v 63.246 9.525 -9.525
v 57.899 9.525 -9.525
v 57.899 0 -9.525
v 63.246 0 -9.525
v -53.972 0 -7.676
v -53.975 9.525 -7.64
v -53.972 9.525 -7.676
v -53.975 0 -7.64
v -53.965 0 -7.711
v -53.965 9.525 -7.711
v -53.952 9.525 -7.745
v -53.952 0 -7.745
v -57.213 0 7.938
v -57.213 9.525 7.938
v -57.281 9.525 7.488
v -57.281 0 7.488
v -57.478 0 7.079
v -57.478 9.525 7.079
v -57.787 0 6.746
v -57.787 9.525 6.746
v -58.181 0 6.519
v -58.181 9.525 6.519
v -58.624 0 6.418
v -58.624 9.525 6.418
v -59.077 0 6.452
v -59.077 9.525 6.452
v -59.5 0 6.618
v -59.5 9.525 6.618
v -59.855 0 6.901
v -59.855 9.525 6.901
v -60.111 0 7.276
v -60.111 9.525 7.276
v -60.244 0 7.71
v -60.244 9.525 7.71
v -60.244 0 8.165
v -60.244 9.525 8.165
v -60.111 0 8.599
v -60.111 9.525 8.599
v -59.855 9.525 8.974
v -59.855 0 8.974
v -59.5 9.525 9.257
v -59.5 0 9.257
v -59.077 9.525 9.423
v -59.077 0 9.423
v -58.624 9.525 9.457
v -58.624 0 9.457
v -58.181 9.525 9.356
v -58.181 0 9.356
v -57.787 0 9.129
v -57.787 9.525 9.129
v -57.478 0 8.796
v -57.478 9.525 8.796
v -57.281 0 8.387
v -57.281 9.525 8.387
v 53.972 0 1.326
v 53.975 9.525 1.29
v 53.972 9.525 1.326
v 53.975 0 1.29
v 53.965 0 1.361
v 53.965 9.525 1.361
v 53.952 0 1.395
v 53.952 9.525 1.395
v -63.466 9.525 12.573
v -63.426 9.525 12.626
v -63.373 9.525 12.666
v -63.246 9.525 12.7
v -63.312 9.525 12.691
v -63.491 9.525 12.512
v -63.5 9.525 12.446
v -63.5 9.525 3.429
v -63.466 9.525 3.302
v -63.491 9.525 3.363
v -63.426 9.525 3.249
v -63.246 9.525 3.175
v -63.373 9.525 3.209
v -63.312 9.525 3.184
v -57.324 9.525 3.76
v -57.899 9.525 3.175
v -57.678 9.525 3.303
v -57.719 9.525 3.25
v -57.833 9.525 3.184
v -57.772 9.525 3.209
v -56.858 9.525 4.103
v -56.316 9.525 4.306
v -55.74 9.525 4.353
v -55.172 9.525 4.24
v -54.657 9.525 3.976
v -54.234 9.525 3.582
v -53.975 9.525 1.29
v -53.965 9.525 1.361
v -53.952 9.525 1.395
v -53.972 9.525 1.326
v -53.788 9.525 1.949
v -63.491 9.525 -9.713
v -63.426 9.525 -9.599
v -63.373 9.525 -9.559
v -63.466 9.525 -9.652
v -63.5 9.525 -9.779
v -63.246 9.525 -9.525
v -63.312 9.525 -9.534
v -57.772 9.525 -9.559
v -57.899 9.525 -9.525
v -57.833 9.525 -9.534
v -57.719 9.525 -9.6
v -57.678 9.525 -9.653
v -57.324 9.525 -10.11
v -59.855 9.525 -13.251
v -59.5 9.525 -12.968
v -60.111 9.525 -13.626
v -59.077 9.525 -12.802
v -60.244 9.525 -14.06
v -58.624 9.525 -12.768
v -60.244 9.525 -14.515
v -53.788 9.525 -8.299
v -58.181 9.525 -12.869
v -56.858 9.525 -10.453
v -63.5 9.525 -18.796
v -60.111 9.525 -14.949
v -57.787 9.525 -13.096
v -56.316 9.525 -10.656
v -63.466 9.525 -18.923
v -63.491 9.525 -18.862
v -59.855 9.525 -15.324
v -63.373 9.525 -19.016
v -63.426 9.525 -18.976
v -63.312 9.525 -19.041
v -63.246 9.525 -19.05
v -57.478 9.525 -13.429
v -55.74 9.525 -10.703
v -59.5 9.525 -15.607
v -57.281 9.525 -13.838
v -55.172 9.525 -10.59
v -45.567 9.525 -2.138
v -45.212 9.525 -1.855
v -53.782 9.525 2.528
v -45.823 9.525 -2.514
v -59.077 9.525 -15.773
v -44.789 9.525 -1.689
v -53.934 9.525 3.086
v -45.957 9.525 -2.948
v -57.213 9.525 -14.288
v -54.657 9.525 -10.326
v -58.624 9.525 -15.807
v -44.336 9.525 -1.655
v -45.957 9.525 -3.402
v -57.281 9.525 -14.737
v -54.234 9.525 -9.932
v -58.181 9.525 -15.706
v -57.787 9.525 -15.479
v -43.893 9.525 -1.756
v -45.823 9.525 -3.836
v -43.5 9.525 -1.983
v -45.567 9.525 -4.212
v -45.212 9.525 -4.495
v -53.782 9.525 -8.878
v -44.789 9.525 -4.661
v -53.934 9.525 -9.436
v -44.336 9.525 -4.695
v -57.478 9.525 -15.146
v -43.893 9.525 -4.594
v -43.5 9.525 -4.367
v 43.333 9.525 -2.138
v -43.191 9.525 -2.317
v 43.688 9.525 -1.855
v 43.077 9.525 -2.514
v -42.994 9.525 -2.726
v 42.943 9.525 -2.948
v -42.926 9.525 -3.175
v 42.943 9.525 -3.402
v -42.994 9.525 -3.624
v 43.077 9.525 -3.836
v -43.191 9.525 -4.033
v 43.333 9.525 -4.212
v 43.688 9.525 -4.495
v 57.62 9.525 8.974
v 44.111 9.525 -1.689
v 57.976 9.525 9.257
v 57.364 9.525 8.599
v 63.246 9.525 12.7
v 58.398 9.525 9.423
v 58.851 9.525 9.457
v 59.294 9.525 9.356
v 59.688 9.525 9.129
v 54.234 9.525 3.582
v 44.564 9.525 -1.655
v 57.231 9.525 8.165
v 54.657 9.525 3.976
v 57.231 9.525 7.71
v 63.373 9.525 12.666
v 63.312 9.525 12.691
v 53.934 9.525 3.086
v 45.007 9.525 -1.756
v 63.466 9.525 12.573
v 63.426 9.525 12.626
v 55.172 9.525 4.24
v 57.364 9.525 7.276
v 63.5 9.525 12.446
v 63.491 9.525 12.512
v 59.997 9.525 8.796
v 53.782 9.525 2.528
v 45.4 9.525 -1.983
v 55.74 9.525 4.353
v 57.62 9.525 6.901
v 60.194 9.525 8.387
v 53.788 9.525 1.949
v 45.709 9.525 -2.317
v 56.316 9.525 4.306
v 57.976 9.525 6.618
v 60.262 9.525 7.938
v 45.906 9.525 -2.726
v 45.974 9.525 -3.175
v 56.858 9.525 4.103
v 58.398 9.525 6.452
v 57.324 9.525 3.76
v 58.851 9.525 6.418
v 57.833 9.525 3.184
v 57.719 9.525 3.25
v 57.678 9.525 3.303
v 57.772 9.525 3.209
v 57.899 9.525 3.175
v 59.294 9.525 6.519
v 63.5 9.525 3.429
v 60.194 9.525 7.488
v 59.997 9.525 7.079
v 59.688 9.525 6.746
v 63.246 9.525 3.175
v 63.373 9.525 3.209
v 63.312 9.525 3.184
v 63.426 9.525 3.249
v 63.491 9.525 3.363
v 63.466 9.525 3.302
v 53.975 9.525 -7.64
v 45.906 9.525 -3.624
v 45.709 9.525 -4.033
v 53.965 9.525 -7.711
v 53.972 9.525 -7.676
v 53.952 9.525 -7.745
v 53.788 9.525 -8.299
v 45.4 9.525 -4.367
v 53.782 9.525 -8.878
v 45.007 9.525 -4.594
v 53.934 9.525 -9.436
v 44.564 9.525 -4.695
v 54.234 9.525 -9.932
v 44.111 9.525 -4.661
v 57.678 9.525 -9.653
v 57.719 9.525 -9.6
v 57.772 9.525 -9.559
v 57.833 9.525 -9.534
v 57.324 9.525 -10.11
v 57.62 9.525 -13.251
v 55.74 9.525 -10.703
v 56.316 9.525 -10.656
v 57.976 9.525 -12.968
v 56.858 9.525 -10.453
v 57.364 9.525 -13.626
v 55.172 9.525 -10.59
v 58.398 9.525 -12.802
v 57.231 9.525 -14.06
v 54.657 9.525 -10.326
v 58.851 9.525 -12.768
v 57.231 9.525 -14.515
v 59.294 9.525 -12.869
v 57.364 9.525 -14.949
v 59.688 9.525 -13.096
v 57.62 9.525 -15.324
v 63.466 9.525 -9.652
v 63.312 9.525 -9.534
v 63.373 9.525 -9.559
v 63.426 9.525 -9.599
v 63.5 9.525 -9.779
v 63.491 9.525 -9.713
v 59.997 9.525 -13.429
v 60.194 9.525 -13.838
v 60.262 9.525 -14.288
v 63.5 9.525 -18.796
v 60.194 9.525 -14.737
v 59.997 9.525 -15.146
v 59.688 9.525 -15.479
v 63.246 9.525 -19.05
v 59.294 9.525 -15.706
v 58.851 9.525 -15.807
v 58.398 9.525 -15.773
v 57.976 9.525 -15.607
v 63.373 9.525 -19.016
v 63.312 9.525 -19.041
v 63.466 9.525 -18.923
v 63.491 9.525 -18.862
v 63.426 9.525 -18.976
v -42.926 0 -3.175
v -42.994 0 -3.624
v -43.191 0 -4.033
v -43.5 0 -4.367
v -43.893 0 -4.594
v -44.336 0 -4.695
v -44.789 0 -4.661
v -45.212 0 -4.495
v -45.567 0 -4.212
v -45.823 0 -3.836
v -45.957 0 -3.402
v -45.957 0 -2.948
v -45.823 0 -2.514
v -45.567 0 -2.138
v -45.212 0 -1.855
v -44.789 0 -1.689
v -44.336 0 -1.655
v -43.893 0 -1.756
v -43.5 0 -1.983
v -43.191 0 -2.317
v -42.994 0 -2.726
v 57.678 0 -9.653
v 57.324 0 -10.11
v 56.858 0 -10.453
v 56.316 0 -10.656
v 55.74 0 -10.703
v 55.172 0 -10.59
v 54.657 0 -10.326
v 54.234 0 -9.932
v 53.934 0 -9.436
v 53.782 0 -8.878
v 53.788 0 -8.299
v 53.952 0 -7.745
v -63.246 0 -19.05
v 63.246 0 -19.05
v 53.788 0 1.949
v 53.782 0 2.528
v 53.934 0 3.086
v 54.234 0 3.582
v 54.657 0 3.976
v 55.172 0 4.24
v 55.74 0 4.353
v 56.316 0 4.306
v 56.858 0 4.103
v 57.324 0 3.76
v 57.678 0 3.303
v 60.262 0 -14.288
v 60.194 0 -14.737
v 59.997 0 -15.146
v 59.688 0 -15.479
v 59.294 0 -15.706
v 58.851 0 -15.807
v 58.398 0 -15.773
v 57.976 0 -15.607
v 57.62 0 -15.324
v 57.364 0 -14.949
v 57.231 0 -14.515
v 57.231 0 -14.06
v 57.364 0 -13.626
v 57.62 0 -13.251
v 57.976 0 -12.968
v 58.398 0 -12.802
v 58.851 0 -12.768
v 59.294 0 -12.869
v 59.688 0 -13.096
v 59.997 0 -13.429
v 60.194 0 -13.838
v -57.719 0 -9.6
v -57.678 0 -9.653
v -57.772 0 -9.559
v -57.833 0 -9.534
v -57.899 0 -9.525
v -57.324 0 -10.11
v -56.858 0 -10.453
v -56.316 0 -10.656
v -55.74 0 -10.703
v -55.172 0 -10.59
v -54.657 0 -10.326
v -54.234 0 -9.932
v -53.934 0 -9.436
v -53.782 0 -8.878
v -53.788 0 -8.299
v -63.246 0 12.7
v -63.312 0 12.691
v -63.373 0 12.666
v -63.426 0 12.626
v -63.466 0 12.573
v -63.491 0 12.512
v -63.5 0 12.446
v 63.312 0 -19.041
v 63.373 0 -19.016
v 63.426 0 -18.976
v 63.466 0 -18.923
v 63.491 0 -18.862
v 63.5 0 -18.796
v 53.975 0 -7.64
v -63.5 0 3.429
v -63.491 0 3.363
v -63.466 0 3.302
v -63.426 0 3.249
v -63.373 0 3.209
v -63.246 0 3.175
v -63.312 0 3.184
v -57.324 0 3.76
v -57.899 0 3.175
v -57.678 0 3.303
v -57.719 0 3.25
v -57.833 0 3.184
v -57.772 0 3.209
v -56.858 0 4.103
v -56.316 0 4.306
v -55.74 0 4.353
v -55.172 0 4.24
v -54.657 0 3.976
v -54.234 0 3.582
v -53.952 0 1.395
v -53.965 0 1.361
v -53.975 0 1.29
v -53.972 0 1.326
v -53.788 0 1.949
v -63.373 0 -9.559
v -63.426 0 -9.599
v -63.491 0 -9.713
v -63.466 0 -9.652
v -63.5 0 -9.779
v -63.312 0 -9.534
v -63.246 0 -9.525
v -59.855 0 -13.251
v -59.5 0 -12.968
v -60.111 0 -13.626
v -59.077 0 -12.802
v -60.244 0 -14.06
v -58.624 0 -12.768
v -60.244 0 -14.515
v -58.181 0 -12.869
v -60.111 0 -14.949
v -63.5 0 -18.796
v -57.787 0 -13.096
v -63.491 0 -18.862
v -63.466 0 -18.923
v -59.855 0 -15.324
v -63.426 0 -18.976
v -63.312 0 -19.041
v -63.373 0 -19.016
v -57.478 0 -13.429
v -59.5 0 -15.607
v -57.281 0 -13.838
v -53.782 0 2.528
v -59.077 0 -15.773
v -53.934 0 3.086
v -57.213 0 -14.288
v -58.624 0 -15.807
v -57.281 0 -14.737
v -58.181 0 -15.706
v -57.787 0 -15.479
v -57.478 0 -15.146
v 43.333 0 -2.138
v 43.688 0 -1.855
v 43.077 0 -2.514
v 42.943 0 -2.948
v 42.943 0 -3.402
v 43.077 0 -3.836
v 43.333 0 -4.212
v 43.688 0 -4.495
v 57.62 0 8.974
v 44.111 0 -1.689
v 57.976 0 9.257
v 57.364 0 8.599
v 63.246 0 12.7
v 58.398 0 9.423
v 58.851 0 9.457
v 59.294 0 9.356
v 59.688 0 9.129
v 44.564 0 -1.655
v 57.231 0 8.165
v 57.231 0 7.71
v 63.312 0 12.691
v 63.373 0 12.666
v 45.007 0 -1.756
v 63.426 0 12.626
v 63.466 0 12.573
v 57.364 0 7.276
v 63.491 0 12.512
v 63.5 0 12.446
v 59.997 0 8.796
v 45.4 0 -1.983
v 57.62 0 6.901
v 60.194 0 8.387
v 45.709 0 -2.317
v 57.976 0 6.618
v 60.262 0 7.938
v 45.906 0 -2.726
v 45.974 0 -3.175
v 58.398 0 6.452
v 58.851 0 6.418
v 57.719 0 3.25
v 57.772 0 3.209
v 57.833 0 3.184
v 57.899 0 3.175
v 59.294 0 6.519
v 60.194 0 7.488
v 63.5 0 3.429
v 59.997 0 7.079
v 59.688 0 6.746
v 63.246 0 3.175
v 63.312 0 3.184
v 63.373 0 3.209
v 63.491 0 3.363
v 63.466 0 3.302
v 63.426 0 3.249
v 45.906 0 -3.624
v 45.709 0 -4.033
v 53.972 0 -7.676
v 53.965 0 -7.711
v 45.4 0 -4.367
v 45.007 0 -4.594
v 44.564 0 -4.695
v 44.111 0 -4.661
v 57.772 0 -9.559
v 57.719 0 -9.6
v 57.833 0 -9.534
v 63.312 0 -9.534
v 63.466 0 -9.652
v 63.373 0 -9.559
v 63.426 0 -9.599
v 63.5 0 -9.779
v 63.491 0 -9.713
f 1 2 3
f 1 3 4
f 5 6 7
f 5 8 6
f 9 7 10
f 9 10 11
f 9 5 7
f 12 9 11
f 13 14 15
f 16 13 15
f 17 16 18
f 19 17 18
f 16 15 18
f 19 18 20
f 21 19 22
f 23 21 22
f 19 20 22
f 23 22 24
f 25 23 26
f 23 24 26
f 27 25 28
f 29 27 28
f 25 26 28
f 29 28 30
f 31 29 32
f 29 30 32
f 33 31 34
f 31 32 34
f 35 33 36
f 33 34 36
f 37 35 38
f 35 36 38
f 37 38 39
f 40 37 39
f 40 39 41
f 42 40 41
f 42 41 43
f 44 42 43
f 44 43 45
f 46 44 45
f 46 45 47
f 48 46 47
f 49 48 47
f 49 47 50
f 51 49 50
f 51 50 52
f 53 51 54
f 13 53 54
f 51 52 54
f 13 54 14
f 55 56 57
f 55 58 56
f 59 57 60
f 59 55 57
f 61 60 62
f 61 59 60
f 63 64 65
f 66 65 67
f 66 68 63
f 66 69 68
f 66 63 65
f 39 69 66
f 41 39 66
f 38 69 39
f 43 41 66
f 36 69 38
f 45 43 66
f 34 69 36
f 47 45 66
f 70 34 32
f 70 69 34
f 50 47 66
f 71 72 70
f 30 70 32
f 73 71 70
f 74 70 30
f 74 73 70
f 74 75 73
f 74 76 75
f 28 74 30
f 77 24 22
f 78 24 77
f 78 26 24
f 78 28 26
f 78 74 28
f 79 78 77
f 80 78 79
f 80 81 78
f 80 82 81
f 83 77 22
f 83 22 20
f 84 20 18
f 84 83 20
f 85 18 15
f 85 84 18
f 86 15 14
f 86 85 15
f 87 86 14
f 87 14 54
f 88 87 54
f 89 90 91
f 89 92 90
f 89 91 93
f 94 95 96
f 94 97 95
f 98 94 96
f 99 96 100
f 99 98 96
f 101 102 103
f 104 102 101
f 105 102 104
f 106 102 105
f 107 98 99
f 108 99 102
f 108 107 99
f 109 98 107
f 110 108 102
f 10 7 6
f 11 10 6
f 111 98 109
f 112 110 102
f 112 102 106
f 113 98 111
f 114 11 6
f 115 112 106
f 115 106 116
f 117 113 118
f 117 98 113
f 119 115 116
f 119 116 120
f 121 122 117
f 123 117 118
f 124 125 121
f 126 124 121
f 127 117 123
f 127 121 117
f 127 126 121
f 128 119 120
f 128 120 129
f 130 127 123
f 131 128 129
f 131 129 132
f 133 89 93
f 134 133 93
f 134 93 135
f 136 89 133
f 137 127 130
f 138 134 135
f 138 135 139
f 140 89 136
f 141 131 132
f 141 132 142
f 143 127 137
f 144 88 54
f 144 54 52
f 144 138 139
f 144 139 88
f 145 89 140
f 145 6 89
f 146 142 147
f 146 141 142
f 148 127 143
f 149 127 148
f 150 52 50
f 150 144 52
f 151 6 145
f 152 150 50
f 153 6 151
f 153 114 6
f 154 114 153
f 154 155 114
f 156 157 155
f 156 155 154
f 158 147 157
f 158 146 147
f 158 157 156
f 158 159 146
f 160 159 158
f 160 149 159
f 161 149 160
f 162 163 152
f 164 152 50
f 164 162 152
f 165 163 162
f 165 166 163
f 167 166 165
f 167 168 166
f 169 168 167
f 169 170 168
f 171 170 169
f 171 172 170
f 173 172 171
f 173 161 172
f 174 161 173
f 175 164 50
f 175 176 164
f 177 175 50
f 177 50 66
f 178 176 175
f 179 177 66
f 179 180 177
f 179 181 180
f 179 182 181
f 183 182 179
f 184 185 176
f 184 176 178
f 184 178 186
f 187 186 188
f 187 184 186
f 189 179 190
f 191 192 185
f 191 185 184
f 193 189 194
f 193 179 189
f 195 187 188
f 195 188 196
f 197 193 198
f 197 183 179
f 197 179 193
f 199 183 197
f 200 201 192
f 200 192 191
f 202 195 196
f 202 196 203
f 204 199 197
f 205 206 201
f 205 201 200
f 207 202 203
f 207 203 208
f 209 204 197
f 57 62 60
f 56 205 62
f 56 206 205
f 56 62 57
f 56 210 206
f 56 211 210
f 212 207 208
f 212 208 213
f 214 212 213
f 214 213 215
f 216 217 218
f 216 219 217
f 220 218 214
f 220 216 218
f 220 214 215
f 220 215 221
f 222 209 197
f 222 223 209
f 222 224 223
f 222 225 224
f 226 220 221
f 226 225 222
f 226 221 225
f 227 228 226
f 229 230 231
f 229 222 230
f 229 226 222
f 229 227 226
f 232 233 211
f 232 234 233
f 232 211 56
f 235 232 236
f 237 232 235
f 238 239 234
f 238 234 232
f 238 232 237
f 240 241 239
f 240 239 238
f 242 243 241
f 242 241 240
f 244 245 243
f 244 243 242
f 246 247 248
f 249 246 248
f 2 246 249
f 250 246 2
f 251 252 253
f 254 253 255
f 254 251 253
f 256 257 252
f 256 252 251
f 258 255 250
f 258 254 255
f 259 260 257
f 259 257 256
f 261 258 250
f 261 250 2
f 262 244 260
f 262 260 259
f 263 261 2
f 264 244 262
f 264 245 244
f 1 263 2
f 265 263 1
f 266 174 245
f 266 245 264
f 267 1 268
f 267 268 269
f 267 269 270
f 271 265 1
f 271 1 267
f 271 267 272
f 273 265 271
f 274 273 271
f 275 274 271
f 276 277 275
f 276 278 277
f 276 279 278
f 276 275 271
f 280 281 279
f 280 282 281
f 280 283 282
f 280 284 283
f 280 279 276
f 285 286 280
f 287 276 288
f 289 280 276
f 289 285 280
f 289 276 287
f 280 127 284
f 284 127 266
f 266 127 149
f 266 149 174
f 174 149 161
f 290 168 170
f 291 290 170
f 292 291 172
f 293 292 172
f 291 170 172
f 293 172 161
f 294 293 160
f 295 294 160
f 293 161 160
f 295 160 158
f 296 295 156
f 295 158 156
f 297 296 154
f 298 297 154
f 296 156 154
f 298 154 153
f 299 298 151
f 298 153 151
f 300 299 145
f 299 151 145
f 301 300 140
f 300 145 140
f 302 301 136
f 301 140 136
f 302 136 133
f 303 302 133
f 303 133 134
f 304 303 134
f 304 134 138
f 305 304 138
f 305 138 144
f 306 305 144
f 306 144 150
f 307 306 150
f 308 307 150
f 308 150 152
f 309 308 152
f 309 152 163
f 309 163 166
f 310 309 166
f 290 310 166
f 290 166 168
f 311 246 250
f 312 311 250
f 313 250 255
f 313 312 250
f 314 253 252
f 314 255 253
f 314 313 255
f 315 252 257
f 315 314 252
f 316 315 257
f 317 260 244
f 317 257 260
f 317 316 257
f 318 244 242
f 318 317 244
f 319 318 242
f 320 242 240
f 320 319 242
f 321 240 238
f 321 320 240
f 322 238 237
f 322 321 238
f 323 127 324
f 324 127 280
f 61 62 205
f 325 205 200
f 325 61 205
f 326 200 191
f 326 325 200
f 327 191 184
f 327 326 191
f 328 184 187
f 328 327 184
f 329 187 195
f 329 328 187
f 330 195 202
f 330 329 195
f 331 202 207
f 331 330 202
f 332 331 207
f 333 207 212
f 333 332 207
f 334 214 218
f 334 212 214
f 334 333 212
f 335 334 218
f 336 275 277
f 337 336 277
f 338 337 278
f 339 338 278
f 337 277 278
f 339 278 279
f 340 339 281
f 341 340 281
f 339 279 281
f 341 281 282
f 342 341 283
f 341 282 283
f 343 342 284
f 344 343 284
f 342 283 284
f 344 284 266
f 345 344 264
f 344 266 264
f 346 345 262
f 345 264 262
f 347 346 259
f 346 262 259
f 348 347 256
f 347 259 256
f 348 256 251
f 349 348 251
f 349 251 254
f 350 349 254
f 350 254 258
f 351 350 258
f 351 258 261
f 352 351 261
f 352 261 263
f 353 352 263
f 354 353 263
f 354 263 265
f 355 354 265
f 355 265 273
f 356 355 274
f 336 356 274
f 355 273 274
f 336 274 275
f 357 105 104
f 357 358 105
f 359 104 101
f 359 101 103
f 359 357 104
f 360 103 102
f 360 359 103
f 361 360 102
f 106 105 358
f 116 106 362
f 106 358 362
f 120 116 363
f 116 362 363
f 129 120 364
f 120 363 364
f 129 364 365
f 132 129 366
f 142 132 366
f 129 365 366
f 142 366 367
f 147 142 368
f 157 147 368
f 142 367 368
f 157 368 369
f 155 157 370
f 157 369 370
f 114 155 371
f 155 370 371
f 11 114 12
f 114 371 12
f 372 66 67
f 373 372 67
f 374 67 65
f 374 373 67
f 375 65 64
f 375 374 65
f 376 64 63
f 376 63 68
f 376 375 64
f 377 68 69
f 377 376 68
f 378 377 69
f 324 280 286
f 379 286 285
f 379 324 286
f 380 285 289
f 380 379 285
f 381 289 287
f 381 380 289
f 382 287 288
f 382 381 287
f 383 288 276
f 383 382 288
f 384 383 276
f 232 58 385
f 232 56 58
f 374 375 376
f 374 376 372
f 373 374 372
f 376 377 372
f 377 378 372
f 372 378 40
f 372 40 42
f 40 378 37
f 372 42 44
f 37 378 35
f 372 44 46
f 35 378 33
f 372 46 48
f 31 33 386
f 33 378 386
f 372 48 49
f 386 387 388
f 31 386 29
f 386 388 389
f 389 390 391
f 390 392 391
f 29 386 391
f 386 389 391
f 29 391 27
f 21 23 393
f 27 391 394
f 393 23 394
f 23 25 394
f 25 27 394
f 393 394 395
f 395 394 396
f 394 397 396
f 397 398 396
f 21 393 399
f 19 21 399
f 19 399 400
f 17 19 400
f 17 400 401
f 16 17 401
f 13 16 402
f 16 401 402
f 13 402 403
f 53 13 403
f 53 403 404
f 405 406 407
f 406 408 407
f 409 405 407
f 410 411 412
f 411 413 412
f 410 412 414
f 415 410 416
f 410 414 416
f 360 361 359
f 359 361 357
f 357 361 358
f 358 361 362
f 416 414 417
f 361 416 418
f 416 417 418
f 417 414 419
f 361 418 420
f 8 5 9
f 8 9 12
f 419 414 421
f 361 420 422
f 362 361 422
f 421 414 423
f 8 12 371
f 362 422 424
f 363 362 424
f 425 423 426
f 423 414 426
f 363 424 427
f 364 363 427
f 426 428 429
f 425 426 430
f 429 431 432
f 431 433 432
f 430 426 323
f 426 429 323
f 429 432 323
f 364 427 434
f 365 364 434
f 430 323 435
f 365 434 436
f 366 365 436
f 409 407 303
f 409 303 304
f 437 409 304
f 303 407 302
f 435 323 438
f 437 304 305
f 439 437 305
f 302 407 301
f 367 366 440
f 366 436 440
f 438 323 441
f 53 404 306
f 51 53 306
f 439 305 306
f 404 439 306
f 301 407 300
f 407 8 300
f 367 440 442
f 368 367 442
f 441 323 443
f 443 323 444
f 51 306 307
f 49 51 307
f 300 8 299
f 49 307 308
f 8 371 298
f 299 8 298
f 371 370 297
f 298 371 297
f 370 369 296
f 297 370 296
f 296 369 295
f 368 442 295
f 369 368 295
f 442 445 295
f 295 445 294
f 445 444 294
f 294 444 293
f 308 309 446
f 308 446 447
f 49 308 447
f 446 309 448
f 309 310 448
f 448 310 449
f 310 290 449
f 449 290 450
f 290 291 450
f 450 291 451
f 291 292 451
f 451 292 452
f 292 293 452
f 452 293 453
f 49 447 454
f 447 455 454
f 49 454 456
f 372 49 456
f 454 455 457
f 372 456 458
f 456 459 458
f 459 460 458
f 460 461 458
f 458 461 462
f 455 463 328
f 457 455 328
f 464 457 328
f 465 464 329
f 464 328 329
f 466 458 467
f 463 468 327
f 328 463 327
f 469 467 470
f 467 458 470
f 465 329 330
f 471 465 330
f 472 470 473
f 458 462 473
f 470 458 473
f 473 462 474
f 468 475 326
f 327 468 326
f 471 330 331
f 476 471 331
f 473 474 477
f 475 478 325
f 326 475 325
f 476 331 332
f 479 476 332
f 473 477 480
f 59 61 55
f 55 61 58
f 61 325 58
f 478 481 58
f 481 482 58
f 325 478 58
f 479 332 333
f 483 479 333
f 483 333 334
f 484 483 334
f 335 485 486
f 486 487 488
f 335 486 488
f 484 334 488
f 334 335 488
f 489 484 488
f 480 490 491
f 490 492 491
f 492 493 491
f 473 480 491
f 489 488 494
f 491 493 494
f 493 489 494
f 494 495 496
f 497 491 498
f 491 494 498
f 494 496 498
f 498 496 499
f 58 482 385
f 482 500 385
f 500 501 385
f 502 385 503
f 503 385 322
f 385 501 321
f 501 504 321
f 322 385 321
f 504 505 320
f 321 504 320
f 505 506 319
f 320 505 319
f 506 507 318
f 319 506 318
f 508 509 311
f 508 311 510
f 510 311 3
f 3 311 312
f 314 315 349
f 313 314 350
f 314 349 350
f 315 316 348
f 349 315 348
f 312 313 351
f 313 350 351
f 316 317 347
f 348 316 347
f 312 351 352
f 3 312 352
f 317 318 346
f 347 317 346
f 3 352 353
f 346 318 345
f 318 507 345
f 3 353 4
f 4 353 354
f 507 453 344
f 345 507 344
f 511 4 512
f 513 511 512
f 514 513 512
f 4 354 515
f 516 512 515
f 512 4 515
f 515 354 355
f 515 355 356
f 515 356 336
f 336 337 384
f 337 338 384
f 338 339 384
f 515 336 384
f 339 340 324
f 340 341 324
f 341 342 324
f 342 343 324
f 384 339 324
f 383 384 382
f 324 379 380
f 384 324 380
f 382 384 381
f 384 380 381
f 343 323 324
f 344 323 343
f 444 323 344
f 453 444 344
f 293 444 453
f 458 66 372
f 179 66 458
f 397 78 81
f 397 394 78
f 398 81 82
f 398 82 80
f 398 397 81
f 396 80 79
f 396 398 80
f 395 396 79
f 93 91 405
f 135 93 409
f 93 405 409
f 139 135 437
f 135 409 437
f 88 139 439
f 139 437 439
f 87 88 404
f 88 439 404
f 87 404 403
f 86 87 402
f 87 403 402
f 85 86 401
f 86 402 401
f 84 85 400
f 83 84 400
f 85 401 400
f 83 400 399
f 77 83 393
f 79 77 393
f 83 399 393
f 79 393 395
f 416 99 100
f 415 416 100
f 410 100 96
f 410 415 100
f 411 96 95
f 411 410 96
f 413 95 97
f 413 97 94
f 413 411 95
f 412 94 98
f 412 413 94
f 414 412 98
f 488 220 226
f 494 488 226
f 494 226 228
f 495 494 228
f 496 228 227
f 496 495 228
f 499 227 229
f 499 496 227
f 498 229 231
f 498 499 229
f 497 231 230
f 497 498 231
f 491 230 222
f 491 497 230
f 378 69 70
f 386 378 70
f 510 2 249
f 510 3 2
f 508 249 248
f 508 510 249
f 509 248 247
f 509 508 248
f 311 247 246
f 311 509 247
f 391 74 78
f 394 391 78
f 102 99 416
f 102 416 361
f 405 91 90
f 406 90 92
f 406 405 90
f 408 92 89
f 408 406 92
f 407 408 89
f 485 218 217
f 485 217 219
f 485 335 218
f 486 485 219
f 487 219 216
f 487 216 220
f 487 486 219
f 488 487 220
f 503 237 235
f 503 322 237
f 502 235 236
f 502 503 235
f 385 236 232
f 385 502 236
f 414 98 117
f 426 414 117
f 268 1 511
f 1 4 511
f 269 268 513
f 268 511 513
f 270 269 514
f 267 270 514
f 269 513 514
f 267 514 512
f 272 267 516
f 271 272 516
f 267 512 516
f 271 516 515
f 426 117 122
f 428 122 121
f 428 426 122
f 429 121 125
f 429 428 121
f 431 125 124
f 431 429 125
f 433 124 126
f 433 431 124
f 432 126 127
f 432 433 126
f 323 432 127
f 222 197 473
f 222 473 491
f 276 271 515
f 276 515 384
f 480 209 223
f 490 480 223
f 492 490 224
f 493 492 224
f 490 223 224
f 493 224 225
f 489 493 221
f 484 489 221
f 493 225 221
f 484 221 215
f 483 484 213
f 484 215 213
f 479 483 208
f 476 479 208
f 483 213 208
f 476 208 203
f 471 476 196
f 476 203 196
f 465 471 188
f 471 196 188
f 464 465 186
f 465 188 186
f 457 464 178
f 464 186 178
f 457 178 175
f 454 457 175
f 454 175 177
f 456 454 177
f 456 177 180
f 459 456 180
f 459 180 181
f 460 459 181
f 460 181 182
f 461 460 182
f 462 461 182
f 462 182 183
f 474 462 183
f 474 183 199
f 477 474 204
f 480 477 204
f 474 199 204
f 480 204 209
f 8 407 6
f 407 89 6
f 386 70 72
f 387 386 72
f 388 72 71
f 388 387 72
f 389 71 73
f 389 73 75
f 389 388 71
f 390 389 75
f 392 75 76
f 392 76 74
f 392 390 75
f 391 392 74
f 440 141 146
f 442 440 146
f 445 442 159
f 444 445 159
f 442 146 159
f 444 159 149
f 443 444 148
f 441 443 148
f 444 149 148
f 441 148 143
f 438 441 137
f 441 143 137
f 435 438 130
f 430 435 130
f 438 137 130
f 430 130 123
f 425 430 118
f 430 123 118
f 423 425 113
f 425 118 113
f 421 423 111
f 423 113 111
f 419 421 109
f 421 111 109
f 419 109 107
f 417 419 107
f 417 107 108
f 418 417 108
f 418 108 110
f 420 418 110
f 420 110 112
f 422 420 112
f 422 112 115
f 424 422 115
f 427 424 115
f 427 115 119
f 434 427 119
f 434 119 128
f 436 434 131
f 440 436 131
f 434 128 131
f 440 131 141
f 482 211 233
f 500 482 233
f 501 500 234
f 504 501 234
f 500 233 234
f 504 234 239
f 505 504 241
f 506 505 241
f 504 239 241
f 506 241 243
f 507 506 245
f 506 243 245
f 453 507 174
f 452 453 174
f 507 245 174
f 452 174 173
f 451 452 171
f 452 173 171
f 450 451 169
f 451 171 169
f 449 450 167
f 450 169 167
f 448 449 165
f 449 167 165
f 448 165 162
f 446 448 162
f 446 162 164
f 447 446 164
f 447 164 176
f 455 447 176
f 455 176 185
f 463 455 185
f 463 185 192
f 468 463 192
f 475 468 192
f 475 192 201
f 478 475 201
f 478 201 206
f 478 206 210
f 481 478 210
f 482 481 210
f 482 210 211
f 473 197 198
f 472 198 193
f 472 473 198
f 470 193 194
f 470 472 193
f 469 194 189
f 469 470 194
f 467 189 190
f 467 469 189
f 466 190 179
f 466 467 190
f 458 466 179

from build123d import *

# Parameters (mm, degrees)
SKETCH1_W           = 107.95
SKETCH1_H           = 25.4
BOSS_EXTRUDE1_DEPTH = 9.525
SKETCH3_W           = 107.95
SKETCH3_H           = 6.35
CUT_EXTRUDE2_DEPTH  = 10.525
SKETCH5_R           = 1.524
CUT_EXTRUDE4_DEPTH  = 10.525
SKETCH6_W           = 107.95
SKETCH6_H           = 6.35
BOSS_EXTRUDE2_DEPTH = 9.525
SKETCH7_W           = 9.525
SKETCH7_H           = 9.525
SKETCH7_R           = 1.524
BOSS_EXTRUDE3_DEPTH = 9.525
SKETCH8_R           = 2.0955
CUT_EXTRUDE5_DEPTH  = 10.525
FILLET3_R           = 0.254


with BuildPart() as part:
    # Sketch1 → Boss-Extrude1 (new body)
    with BuildSketch(Plane(origin=(0, 0, 0), x_dir=(1, 0, 0), z_dir=(0, 1, 0))):
        Rectangle(SKETCH1_W, SKETCH1_H)
    extrude(amount=BOSS_EXTRUDE1_DEPTH)

    # Sketch3 → Cut-Extrude2 (cut, through all)
    with BuildSketch(Plane.XZ):
        with Locations((0, 9.525)):
            Rectangle(SKETCH3_W, SKETCH3_H)
    extrude(amount=-CUT_EXTRUDE2_DEPTH, mode=Mode.SUBTRACT)

    # Sketch5 → Cut-Extrude4 (cut, through all)
    with BuildSketch(Plane(origin=(0, 9.525, 0), x_dir=(1, 0, 0), z_dir=(0, 1, 0))):
        with Locations((44.45, 3.175)):
            Circle(SKETCH5_R)
        with Locations((-44.45, 3.175)):
            Circle(SKETCH5_R)
    extrude(amount=-CUT_EXTRUDE4_DEPTH, mode=Mode.SUBTRACT)

    # Sketch6 → Boss-Extrude2 (add, through all)
    with BuildSketch(Plane(origin=(0, 9.525, 0), x_dir=(1, 0, 0), z_dir=(0, 1, 0))):
        with Locations((0, 15.875)):
            Rectangle(SKETCH6_W, SKETCH6_H)
        with Locations((0, -9.525)):
            Rectangle(SKETCH6_W, SKETCH6_H)
    extrude(amount=-BOSS_EXTRUDE2_DEPTH)

    # Sketch7 → Boss-Extrude3 (add, through all)
    with BuildSketch(Plane(origin=(0, 9.525, 0), x_dir=(1, 0, 0), z_dir=(0, 1, 0))):
        with Locations((58.7375, 14.2875)):
            Rectangle(SKETCH7_W, SKETCH7_H)
        with Locations((58.7375, 14.2875)):
            Circle(SKETCH7_R, mode=Mode.SUBTRACT)
        with Locations((58.7375, -7.9375)):
            Rectangle(SKETCH7_W, SKETCH7_H)
        with Locations((58.7375, -7.9375)):
            Circle(SKETCH7_R, mode=Mode.SUBTRACT)
        with Locations((-58.7375, -7.9375)):
            Rectangle(SKETCH7_W, SKETCH7_H)
        with Locations((-58.7375, -7.9375)):
            Circle(SKETCH7_R, mode=Mode.SUBTRACT)
        with Locations((-58.7375, 14.2875)):
            Rectangle(SKETCH7_W, SKETCH7_H)
        with Locations((-58.7375, 14.2875)):
            Circle(SKETCH7_R, mode=Mode.SUBTRACT)
    extrude(amount=-BOSS_EXTRUDE3_DEPTH)

    # Sketch8 → Cut-Extrude5 (cut, through all)
    with BuildSketch(Plane(origin=(0, 0, 0), x_dir=(-1, 0, 0), z_dir=(0, -1, 0))):
        with Locations((55.860468878, -2.2606)):
            Circle(SKETCH8_R)
        with Locations((55.860468878, 8.6106)):
            Circle(SKETCH8_R)
    cut_extrude5 = extrude(amount=-CUT_EXTRUDE5_DEPTH, mode=Mode.SUBTRACT)

    # Mirror1: Cut-Extrude5 across plane
    add(cut_extrude5.mirror(Plane(origin=(0, 0, 0), x_dir=(0, 0, 1), z_dir=(1, 0, 0))), mode=Mode.SUBTRACT)

    # Fillet3
    fillet3_edges = [part.edges().sort_by_distance(p)[0] for p in [
        (-63.5, 4.7625, -9.525),
        (-63.5, 4.7625, -19.05),
        (-57.745937756, 4.7625, -9.525),
        (-57.745937756, 4.7625, 3.175),
        (-53.975, 4.7625, 1.3462),
        (-53.975, 4.7625, -7.6962),
        (57.745937756, 4.7625, 3.175),
        (57.745937756, 4.7625, -9.525),
        (53.975, 4.7625, 1.3462),
        (53.975, 4.7625, -7.6962),
        (63.5, 4.7625, -19.05),
        (63.5, 4.7625, -9.525),
        (63.5, 4.7625, 3.175),
        (63.5, 4.7625, 12.7),
        (-63.5, 4.7625, 12.7),
        (-63.5, 4.7625, 3.175),
    ]]
    fillet(fillet3_edges, radius=FILLET3_R)


solid = part.part
